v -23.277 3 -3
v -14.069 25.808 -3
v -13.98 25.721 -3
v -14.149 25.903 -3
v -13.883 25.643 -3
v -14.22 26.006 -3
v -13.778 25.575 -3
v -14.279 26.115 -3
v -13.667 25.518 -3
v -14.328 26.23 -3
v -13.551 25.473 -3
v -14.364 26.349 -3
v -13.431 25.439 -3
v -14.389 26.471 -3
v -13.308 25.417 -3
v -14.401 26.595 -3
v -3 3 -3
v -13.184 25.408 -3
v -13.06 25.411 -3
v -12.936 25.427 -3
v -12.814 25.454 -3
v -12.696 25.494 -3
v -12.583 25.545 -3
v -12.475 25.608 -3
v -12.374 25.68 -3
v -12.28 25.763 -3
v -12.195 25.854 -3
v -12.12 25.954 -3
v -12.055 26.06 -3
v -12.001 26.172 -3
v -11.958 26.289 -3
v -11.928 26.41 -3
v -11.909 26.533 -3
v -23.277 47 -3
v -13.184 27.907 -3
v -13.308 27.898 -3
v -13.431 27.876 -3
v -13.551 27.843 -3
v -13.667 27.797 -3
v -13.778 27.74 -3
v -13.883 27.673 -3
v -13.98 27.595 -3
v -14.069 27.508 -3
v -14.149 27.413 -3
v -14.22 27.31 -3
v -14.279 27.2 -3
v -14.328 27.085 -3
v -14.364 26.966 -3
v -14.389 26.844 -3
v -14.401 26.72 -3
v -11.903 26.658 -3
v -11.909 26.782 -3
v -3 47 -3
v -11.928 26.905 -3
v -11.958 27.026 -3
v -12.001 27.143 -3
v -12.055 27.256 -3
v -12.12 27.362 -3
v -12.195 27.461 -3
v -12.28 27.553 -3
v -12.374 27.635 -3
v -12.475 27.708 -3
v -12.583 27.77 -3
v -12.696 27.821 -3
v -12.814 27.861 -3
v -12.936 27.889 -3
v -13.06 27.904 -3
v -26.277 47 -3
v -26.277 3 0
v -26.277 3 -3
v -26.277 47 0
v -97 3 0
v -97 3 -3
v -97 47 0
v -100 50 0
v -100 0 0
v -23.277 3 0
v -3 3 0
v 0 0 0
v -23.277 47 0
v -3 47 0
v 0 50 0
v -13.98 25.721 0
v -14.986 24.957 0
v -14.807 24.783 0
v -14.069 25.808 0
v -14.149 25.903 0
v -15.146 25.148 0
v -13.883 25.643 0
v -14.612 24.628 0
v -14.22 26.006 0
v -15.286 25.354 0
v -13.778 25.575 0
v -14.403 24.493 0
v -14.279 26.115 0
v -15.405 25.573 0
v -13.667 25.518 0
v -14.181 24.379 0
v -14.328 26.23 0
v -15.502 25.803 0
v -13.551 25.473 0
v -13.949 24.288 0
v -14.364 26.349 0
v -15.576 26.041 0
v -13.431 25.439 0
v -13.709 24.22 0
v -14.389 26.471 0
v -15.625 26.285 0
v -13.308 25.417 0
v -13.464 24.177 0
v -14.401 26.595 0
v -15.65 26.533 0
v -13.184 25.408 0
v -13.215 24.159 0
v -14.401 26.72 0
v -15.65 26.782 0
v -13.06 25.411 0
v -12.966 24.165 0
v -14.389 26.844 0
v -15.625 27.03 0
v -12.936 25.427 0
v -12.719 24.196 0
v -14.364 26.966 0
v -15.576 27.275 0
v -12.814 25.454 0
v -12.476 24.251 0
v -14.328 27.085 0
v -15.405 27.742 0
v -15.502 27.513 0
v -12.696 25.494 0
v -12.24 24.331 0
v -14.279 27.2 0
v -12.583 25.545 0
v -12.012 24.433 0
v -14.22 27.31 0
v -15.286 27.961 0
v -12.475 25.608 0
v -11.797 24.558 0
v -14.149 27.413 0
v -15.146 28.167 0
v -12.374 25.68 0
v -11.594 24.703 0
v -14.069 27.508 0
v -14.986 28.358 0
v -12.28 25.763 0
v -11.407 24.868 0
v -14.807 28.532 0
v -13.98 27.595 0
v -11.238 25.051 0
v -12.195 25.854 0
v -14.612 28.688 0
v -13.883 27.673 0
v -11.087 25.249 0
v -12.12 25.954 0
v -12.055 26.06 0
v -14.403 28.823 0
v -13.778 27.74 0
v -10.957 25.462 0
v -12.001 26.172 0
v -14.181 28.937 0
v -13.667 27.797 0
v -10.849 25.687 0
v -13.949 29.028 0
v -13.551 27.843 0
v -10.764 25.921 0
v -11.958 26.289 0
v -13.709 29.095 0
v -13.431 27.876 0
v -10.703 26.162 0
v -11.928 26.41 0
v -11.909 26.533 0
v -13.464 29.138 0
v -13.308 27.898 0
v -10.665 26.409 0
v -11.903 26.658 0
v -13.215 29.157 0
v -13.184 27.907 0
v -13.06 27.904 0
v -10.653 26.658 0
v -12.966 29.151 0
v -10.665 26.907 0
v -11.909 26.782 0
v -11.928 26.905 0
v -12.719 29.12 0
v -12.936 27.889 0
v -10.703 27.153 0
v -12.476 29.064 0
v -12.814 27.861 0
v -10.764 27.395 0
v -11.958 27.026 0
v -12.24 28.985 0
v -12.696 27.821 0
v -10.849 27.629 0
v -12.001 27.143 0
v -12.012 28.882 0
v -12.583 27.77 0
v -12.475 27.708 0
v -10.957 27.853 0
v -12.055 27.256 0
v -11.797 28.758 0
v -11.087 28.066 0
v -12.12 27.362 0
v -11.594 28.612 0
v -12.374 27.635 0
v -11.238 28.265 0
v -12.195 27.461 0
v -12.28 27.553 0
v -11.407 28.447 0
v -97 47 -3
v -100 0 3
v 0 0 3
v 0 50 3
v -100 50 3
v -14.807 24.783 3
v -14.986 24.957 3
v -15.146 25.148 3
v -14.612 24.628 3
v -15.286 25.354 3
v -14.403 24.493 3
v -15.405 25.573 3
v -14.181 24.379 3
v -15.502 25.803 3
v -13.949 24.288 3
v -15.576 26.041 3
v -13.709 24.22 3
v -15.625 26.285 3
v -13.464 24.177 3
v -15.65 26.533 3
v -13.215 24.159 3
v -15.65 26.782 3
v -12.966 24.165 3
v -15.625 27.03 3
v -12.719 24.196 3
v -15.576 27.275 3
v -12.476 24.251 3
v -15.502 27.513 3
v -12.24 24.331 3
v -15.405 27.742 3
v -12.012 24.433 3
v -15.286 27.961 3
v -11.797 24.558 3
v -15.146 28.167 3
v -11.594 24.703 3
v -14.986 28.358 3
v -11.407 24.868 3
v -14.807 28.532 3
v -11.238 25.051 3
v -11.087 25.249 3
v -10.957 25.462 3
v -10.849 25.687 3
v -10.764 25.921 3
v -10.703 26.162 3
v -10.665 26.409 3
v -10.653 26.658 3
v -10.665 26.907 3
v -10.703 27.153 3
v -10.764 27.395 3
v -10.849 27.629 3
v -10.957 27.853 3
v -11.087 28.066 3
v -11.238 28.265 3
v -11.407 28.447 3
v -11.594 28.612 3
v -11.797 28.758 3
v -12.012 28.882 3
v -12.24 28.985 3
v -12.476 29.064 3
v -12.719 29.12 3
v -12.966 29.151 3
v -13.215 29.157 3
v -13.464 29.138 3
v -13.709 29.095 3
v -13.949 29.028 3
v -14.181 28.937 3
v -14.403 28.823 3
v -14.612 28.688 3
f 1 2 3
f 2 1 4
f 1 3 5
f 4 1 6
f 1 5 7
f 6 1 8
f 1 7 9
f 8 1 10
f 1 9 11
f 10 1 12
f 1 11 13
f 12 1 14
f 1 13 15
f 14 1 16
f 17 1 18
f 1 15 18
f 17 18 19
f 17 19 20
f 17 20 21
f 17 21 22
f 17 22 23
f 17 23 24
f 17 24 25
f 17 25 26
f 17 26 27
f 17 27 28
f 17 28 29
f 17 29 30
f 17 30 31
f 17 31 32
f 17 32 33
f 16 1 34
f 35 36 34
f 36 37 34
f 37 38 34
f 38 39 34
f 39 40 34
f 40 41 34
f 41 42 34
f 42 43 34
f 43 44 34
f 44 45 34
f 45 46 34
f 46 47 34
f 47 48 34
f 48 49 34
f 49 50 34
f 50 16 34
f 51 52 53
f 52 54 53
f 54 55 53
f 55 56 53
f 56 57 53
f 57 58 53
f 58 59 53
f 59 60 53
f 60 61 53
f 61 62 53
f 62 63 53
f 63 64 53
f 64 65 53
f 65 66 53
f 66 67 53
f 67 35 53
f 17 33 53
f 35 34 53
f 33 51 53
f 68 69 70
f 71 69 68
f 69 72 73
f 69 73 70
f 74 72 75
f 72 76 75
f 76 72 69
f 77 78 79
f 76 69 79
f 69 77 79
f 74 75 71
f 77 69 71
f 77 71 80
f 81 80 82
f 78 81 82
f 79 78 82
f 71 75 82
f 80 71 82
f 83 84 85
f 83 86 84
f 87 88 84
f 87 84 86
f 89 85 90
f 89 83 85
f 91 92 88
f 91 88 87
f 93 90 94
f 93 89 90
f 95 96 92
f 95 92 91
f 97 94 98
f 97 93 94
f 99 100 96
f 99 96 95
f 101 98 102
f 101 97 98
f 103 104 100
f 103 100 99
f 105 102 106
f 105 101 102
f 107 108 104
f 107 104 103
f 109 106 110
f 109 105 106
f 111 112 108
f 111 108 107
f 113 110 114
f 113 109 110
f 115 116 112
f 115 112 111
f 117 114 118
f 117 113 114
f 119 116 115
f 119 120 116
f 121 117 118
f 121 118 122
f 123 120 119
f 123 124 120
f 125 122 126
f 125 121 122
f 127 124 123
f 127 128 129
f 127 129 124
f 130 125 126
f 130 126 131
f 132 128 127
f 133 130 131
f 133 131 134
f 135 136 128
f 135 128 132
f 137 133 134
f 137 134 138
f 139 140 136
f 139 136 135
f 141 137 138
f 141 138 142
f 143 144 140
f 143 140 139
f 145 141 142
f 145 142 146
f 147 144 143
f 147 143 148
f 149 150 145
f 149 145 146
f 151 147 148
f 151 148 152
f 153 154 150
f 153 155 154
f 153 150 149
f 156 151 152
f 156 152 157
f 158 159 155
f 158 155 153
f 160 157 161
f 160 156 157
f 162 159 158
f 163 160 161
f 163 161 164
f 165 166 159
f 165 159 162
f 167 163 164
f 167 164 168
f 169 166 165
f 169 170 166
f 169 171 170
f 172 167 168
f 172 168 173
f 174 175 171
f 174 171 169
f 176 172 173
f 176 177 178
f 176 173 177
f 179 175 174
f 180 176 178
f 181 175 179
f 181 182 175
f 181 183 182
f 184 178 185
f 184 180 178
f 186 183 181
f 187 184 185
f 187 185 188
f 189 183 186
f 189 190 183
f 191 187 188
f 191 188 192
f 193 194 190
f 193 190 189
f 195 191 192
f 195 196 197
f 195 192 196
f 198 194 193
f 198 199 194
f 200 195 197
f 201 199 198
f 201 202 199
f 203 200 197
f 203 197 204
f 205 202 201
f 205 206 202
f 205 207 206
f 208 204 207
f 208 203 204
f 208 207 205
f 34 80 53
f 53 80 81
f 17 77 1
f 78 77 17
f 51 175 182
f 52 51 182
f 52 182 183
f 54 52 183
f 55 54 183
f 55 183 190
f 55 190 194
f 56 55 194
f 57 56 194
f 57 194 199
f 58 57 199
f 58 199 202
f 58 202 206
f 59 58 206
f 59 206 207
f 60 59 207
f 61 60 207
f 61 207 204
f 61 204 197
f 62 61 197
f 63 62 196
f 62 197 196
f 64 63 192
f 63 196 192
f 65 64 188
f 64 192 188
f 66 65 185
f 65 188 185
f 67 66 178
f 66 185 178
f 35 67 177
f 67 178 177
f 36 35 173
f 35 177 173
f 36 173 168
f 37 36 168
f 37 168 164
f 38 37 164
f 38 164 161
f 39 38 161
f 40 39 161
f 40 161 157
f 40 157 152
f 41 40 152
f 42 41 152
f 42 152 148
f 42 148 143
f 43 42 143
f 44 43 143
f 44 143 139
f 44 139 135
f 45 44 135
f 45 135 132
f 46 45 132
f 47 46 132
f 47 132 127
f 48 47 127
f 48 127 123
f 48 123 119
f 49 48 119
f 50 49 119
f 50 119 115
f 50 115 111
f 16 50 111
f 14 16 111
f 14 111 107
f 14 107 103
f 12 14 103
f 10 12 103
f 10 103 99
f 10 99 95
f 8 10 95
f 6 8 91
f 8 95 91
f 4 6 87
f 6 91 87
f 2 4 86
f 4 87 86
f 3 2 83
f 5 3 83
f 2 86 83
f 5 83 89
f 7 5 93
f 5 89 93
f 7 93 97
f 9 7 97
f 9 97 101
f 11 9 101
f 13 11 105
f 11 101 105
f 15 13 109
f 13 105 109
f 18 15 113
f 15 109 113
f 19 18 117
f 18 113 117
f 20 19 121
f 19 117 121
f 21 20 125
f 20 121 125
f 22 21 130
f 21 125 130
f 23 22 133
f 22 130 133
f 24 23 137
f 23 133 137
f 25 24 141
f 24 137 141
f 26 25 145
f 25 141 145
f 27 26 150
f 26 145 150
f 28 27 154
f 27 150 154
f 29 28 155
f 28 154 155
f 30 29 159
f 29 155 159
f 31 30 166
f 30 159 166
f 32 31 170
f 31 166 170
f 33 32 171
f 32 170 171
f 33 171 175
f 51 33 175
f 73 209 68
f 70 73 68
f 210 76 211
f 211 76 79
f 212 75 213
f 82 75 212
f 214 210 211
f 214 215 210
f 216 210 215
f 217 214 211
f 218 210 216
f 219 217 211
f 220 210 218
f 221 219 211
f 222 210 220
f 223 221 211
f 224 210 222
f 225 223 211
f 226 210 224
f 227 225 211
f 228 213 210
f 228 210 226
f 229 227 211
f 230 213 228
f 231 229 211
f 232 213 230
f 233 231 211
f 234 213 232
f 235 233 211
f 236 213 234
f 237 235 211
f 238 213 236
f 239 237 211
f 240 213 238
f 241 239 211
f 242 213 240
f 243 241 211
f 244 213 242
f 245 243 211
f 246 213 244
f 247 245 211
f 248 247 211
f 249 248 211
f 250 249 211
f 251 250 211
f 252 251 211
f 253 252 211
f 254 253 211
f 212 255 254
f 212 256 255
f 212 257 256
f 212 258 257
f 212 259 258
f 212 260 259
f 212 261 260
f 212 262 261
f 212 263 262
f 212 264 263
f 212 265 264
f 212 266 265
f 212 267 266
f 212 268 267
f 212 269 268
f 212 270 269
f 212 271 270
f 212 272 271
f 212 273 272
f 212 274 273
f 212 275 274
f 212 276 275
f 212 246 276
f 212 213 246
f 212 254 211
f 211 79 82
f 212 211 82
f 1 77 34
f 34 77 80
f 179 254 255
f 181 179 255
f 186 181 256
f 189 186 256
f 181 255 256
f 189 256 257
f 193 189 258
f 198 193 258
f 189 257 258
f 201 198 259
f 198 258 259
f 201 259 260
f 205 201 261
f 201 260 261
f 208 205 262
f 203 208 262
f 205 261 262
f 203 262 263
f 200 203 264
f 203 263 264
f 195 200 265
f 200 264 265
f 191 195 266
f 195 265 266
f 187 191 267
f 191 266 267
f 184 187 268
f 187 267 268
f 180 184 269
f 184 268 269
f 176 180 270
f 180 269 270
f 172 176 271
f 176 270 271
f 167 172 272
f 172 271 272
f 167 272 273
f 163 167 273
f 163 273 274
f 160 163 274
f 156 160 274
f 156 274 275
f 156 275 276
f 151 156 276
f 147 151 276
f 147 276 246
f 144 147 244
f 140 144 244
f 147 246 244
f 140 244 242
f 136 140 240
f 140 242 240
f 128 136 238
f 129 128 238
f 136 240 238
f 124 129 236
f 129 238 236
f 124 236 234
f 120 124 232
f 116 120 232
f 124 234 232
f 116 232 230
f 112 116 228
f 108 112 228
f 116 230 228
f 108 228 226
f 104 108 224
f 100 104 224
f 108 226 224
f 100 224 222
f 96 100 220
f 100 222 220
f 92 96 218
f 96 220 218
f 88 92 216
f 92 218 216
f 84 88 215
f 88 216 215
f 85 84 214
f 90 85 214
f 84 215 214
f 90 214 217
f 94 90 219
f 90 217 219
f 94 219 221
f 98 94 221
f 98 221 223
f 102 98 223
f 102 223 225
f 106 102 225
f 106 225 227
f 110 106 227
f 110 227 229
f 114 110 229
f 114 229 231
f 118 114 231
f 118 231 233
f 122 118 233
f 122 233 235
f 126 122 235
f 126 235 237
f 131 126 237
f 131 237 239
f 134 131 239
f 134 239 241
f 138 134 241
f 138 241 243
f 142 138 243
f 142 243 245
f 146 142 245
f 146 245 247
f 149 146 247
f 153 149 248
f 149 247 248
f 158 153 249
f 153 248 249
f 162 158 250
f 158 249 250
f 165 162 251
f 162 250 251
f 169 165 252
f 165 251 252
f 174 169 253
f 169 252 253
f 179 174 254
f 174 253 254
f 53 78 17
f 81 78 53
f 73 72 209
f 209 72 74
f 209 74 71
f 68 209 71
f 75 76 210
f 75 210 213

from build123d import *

# Parameters (mm, degrees)
F0_W     = 100
F0_H     = 50
F0_W_2   = 70.7229366664
F0_H_2   = 44
F0_W_3   = 20.2770633336
F1_DEPTH = 3
F2_DEPTH = 3
F3_R     = 2.5
F4_DEPTH = 3
F5_R     = 1.25
F6_DEPTH = 25


with BuildPart() as f1:
    # F0 (on Top) → F1 (new body)
    with BuildSketch(Plane.XY):
        with Locations((-50, 25)):
            Rectangle(F0_W, F0_H)
        with Locations((-61.6385316668, 25)):
            Rectangle(F0_W_2, F0_H_2, mode=Mode.SUBTRACT)
        with Locations((-13.1385316668, 25)):
            Rectangle(F0_W_3, F0_H_2, mode=Mode.SUBTRACT)
        with Locations((-61.6385316668, 25)):
            Rectangle(F0_W_2, F0_H_2)
        with Locations((-13.1385316668, 25)):
            Rectangle(F0_W_3, F0_H_2)
    extrude(amount=F1_DEPTH)

    # F0 (on Top) → F2 (join)
    with BuildSketch(Plane.XY):
        with Locations((-61.6385316668, 25)):
            Rectangle(F0_W_2, F0_H_2)
        with Locations((-13.1385316668, 25)):
            Rectangle(F0_W_3, F0_H_2)
    extrude(amount=-F2_DEPTH)

    # F3 (on face) → F4 (cut)
    with BuildSketch(Plane.XY.offset(3)):
        with Locations((-13.1529411301, 26.6577675939)):
            Circle(F3_R)
    extrude(amount=-F4_DEPTH, mode=Mode.SUBTRACT)

    # F5 (on face) → F6 (cut)
    with BuildSketch(Plane.XY):
        with Locations((-13.1529411301, 26.6577675939)):
            Circle(F5_R)
    extrude(amount=-F6_DEPTH, mode=Mode.SUBTRACT)


solid = f1.part
